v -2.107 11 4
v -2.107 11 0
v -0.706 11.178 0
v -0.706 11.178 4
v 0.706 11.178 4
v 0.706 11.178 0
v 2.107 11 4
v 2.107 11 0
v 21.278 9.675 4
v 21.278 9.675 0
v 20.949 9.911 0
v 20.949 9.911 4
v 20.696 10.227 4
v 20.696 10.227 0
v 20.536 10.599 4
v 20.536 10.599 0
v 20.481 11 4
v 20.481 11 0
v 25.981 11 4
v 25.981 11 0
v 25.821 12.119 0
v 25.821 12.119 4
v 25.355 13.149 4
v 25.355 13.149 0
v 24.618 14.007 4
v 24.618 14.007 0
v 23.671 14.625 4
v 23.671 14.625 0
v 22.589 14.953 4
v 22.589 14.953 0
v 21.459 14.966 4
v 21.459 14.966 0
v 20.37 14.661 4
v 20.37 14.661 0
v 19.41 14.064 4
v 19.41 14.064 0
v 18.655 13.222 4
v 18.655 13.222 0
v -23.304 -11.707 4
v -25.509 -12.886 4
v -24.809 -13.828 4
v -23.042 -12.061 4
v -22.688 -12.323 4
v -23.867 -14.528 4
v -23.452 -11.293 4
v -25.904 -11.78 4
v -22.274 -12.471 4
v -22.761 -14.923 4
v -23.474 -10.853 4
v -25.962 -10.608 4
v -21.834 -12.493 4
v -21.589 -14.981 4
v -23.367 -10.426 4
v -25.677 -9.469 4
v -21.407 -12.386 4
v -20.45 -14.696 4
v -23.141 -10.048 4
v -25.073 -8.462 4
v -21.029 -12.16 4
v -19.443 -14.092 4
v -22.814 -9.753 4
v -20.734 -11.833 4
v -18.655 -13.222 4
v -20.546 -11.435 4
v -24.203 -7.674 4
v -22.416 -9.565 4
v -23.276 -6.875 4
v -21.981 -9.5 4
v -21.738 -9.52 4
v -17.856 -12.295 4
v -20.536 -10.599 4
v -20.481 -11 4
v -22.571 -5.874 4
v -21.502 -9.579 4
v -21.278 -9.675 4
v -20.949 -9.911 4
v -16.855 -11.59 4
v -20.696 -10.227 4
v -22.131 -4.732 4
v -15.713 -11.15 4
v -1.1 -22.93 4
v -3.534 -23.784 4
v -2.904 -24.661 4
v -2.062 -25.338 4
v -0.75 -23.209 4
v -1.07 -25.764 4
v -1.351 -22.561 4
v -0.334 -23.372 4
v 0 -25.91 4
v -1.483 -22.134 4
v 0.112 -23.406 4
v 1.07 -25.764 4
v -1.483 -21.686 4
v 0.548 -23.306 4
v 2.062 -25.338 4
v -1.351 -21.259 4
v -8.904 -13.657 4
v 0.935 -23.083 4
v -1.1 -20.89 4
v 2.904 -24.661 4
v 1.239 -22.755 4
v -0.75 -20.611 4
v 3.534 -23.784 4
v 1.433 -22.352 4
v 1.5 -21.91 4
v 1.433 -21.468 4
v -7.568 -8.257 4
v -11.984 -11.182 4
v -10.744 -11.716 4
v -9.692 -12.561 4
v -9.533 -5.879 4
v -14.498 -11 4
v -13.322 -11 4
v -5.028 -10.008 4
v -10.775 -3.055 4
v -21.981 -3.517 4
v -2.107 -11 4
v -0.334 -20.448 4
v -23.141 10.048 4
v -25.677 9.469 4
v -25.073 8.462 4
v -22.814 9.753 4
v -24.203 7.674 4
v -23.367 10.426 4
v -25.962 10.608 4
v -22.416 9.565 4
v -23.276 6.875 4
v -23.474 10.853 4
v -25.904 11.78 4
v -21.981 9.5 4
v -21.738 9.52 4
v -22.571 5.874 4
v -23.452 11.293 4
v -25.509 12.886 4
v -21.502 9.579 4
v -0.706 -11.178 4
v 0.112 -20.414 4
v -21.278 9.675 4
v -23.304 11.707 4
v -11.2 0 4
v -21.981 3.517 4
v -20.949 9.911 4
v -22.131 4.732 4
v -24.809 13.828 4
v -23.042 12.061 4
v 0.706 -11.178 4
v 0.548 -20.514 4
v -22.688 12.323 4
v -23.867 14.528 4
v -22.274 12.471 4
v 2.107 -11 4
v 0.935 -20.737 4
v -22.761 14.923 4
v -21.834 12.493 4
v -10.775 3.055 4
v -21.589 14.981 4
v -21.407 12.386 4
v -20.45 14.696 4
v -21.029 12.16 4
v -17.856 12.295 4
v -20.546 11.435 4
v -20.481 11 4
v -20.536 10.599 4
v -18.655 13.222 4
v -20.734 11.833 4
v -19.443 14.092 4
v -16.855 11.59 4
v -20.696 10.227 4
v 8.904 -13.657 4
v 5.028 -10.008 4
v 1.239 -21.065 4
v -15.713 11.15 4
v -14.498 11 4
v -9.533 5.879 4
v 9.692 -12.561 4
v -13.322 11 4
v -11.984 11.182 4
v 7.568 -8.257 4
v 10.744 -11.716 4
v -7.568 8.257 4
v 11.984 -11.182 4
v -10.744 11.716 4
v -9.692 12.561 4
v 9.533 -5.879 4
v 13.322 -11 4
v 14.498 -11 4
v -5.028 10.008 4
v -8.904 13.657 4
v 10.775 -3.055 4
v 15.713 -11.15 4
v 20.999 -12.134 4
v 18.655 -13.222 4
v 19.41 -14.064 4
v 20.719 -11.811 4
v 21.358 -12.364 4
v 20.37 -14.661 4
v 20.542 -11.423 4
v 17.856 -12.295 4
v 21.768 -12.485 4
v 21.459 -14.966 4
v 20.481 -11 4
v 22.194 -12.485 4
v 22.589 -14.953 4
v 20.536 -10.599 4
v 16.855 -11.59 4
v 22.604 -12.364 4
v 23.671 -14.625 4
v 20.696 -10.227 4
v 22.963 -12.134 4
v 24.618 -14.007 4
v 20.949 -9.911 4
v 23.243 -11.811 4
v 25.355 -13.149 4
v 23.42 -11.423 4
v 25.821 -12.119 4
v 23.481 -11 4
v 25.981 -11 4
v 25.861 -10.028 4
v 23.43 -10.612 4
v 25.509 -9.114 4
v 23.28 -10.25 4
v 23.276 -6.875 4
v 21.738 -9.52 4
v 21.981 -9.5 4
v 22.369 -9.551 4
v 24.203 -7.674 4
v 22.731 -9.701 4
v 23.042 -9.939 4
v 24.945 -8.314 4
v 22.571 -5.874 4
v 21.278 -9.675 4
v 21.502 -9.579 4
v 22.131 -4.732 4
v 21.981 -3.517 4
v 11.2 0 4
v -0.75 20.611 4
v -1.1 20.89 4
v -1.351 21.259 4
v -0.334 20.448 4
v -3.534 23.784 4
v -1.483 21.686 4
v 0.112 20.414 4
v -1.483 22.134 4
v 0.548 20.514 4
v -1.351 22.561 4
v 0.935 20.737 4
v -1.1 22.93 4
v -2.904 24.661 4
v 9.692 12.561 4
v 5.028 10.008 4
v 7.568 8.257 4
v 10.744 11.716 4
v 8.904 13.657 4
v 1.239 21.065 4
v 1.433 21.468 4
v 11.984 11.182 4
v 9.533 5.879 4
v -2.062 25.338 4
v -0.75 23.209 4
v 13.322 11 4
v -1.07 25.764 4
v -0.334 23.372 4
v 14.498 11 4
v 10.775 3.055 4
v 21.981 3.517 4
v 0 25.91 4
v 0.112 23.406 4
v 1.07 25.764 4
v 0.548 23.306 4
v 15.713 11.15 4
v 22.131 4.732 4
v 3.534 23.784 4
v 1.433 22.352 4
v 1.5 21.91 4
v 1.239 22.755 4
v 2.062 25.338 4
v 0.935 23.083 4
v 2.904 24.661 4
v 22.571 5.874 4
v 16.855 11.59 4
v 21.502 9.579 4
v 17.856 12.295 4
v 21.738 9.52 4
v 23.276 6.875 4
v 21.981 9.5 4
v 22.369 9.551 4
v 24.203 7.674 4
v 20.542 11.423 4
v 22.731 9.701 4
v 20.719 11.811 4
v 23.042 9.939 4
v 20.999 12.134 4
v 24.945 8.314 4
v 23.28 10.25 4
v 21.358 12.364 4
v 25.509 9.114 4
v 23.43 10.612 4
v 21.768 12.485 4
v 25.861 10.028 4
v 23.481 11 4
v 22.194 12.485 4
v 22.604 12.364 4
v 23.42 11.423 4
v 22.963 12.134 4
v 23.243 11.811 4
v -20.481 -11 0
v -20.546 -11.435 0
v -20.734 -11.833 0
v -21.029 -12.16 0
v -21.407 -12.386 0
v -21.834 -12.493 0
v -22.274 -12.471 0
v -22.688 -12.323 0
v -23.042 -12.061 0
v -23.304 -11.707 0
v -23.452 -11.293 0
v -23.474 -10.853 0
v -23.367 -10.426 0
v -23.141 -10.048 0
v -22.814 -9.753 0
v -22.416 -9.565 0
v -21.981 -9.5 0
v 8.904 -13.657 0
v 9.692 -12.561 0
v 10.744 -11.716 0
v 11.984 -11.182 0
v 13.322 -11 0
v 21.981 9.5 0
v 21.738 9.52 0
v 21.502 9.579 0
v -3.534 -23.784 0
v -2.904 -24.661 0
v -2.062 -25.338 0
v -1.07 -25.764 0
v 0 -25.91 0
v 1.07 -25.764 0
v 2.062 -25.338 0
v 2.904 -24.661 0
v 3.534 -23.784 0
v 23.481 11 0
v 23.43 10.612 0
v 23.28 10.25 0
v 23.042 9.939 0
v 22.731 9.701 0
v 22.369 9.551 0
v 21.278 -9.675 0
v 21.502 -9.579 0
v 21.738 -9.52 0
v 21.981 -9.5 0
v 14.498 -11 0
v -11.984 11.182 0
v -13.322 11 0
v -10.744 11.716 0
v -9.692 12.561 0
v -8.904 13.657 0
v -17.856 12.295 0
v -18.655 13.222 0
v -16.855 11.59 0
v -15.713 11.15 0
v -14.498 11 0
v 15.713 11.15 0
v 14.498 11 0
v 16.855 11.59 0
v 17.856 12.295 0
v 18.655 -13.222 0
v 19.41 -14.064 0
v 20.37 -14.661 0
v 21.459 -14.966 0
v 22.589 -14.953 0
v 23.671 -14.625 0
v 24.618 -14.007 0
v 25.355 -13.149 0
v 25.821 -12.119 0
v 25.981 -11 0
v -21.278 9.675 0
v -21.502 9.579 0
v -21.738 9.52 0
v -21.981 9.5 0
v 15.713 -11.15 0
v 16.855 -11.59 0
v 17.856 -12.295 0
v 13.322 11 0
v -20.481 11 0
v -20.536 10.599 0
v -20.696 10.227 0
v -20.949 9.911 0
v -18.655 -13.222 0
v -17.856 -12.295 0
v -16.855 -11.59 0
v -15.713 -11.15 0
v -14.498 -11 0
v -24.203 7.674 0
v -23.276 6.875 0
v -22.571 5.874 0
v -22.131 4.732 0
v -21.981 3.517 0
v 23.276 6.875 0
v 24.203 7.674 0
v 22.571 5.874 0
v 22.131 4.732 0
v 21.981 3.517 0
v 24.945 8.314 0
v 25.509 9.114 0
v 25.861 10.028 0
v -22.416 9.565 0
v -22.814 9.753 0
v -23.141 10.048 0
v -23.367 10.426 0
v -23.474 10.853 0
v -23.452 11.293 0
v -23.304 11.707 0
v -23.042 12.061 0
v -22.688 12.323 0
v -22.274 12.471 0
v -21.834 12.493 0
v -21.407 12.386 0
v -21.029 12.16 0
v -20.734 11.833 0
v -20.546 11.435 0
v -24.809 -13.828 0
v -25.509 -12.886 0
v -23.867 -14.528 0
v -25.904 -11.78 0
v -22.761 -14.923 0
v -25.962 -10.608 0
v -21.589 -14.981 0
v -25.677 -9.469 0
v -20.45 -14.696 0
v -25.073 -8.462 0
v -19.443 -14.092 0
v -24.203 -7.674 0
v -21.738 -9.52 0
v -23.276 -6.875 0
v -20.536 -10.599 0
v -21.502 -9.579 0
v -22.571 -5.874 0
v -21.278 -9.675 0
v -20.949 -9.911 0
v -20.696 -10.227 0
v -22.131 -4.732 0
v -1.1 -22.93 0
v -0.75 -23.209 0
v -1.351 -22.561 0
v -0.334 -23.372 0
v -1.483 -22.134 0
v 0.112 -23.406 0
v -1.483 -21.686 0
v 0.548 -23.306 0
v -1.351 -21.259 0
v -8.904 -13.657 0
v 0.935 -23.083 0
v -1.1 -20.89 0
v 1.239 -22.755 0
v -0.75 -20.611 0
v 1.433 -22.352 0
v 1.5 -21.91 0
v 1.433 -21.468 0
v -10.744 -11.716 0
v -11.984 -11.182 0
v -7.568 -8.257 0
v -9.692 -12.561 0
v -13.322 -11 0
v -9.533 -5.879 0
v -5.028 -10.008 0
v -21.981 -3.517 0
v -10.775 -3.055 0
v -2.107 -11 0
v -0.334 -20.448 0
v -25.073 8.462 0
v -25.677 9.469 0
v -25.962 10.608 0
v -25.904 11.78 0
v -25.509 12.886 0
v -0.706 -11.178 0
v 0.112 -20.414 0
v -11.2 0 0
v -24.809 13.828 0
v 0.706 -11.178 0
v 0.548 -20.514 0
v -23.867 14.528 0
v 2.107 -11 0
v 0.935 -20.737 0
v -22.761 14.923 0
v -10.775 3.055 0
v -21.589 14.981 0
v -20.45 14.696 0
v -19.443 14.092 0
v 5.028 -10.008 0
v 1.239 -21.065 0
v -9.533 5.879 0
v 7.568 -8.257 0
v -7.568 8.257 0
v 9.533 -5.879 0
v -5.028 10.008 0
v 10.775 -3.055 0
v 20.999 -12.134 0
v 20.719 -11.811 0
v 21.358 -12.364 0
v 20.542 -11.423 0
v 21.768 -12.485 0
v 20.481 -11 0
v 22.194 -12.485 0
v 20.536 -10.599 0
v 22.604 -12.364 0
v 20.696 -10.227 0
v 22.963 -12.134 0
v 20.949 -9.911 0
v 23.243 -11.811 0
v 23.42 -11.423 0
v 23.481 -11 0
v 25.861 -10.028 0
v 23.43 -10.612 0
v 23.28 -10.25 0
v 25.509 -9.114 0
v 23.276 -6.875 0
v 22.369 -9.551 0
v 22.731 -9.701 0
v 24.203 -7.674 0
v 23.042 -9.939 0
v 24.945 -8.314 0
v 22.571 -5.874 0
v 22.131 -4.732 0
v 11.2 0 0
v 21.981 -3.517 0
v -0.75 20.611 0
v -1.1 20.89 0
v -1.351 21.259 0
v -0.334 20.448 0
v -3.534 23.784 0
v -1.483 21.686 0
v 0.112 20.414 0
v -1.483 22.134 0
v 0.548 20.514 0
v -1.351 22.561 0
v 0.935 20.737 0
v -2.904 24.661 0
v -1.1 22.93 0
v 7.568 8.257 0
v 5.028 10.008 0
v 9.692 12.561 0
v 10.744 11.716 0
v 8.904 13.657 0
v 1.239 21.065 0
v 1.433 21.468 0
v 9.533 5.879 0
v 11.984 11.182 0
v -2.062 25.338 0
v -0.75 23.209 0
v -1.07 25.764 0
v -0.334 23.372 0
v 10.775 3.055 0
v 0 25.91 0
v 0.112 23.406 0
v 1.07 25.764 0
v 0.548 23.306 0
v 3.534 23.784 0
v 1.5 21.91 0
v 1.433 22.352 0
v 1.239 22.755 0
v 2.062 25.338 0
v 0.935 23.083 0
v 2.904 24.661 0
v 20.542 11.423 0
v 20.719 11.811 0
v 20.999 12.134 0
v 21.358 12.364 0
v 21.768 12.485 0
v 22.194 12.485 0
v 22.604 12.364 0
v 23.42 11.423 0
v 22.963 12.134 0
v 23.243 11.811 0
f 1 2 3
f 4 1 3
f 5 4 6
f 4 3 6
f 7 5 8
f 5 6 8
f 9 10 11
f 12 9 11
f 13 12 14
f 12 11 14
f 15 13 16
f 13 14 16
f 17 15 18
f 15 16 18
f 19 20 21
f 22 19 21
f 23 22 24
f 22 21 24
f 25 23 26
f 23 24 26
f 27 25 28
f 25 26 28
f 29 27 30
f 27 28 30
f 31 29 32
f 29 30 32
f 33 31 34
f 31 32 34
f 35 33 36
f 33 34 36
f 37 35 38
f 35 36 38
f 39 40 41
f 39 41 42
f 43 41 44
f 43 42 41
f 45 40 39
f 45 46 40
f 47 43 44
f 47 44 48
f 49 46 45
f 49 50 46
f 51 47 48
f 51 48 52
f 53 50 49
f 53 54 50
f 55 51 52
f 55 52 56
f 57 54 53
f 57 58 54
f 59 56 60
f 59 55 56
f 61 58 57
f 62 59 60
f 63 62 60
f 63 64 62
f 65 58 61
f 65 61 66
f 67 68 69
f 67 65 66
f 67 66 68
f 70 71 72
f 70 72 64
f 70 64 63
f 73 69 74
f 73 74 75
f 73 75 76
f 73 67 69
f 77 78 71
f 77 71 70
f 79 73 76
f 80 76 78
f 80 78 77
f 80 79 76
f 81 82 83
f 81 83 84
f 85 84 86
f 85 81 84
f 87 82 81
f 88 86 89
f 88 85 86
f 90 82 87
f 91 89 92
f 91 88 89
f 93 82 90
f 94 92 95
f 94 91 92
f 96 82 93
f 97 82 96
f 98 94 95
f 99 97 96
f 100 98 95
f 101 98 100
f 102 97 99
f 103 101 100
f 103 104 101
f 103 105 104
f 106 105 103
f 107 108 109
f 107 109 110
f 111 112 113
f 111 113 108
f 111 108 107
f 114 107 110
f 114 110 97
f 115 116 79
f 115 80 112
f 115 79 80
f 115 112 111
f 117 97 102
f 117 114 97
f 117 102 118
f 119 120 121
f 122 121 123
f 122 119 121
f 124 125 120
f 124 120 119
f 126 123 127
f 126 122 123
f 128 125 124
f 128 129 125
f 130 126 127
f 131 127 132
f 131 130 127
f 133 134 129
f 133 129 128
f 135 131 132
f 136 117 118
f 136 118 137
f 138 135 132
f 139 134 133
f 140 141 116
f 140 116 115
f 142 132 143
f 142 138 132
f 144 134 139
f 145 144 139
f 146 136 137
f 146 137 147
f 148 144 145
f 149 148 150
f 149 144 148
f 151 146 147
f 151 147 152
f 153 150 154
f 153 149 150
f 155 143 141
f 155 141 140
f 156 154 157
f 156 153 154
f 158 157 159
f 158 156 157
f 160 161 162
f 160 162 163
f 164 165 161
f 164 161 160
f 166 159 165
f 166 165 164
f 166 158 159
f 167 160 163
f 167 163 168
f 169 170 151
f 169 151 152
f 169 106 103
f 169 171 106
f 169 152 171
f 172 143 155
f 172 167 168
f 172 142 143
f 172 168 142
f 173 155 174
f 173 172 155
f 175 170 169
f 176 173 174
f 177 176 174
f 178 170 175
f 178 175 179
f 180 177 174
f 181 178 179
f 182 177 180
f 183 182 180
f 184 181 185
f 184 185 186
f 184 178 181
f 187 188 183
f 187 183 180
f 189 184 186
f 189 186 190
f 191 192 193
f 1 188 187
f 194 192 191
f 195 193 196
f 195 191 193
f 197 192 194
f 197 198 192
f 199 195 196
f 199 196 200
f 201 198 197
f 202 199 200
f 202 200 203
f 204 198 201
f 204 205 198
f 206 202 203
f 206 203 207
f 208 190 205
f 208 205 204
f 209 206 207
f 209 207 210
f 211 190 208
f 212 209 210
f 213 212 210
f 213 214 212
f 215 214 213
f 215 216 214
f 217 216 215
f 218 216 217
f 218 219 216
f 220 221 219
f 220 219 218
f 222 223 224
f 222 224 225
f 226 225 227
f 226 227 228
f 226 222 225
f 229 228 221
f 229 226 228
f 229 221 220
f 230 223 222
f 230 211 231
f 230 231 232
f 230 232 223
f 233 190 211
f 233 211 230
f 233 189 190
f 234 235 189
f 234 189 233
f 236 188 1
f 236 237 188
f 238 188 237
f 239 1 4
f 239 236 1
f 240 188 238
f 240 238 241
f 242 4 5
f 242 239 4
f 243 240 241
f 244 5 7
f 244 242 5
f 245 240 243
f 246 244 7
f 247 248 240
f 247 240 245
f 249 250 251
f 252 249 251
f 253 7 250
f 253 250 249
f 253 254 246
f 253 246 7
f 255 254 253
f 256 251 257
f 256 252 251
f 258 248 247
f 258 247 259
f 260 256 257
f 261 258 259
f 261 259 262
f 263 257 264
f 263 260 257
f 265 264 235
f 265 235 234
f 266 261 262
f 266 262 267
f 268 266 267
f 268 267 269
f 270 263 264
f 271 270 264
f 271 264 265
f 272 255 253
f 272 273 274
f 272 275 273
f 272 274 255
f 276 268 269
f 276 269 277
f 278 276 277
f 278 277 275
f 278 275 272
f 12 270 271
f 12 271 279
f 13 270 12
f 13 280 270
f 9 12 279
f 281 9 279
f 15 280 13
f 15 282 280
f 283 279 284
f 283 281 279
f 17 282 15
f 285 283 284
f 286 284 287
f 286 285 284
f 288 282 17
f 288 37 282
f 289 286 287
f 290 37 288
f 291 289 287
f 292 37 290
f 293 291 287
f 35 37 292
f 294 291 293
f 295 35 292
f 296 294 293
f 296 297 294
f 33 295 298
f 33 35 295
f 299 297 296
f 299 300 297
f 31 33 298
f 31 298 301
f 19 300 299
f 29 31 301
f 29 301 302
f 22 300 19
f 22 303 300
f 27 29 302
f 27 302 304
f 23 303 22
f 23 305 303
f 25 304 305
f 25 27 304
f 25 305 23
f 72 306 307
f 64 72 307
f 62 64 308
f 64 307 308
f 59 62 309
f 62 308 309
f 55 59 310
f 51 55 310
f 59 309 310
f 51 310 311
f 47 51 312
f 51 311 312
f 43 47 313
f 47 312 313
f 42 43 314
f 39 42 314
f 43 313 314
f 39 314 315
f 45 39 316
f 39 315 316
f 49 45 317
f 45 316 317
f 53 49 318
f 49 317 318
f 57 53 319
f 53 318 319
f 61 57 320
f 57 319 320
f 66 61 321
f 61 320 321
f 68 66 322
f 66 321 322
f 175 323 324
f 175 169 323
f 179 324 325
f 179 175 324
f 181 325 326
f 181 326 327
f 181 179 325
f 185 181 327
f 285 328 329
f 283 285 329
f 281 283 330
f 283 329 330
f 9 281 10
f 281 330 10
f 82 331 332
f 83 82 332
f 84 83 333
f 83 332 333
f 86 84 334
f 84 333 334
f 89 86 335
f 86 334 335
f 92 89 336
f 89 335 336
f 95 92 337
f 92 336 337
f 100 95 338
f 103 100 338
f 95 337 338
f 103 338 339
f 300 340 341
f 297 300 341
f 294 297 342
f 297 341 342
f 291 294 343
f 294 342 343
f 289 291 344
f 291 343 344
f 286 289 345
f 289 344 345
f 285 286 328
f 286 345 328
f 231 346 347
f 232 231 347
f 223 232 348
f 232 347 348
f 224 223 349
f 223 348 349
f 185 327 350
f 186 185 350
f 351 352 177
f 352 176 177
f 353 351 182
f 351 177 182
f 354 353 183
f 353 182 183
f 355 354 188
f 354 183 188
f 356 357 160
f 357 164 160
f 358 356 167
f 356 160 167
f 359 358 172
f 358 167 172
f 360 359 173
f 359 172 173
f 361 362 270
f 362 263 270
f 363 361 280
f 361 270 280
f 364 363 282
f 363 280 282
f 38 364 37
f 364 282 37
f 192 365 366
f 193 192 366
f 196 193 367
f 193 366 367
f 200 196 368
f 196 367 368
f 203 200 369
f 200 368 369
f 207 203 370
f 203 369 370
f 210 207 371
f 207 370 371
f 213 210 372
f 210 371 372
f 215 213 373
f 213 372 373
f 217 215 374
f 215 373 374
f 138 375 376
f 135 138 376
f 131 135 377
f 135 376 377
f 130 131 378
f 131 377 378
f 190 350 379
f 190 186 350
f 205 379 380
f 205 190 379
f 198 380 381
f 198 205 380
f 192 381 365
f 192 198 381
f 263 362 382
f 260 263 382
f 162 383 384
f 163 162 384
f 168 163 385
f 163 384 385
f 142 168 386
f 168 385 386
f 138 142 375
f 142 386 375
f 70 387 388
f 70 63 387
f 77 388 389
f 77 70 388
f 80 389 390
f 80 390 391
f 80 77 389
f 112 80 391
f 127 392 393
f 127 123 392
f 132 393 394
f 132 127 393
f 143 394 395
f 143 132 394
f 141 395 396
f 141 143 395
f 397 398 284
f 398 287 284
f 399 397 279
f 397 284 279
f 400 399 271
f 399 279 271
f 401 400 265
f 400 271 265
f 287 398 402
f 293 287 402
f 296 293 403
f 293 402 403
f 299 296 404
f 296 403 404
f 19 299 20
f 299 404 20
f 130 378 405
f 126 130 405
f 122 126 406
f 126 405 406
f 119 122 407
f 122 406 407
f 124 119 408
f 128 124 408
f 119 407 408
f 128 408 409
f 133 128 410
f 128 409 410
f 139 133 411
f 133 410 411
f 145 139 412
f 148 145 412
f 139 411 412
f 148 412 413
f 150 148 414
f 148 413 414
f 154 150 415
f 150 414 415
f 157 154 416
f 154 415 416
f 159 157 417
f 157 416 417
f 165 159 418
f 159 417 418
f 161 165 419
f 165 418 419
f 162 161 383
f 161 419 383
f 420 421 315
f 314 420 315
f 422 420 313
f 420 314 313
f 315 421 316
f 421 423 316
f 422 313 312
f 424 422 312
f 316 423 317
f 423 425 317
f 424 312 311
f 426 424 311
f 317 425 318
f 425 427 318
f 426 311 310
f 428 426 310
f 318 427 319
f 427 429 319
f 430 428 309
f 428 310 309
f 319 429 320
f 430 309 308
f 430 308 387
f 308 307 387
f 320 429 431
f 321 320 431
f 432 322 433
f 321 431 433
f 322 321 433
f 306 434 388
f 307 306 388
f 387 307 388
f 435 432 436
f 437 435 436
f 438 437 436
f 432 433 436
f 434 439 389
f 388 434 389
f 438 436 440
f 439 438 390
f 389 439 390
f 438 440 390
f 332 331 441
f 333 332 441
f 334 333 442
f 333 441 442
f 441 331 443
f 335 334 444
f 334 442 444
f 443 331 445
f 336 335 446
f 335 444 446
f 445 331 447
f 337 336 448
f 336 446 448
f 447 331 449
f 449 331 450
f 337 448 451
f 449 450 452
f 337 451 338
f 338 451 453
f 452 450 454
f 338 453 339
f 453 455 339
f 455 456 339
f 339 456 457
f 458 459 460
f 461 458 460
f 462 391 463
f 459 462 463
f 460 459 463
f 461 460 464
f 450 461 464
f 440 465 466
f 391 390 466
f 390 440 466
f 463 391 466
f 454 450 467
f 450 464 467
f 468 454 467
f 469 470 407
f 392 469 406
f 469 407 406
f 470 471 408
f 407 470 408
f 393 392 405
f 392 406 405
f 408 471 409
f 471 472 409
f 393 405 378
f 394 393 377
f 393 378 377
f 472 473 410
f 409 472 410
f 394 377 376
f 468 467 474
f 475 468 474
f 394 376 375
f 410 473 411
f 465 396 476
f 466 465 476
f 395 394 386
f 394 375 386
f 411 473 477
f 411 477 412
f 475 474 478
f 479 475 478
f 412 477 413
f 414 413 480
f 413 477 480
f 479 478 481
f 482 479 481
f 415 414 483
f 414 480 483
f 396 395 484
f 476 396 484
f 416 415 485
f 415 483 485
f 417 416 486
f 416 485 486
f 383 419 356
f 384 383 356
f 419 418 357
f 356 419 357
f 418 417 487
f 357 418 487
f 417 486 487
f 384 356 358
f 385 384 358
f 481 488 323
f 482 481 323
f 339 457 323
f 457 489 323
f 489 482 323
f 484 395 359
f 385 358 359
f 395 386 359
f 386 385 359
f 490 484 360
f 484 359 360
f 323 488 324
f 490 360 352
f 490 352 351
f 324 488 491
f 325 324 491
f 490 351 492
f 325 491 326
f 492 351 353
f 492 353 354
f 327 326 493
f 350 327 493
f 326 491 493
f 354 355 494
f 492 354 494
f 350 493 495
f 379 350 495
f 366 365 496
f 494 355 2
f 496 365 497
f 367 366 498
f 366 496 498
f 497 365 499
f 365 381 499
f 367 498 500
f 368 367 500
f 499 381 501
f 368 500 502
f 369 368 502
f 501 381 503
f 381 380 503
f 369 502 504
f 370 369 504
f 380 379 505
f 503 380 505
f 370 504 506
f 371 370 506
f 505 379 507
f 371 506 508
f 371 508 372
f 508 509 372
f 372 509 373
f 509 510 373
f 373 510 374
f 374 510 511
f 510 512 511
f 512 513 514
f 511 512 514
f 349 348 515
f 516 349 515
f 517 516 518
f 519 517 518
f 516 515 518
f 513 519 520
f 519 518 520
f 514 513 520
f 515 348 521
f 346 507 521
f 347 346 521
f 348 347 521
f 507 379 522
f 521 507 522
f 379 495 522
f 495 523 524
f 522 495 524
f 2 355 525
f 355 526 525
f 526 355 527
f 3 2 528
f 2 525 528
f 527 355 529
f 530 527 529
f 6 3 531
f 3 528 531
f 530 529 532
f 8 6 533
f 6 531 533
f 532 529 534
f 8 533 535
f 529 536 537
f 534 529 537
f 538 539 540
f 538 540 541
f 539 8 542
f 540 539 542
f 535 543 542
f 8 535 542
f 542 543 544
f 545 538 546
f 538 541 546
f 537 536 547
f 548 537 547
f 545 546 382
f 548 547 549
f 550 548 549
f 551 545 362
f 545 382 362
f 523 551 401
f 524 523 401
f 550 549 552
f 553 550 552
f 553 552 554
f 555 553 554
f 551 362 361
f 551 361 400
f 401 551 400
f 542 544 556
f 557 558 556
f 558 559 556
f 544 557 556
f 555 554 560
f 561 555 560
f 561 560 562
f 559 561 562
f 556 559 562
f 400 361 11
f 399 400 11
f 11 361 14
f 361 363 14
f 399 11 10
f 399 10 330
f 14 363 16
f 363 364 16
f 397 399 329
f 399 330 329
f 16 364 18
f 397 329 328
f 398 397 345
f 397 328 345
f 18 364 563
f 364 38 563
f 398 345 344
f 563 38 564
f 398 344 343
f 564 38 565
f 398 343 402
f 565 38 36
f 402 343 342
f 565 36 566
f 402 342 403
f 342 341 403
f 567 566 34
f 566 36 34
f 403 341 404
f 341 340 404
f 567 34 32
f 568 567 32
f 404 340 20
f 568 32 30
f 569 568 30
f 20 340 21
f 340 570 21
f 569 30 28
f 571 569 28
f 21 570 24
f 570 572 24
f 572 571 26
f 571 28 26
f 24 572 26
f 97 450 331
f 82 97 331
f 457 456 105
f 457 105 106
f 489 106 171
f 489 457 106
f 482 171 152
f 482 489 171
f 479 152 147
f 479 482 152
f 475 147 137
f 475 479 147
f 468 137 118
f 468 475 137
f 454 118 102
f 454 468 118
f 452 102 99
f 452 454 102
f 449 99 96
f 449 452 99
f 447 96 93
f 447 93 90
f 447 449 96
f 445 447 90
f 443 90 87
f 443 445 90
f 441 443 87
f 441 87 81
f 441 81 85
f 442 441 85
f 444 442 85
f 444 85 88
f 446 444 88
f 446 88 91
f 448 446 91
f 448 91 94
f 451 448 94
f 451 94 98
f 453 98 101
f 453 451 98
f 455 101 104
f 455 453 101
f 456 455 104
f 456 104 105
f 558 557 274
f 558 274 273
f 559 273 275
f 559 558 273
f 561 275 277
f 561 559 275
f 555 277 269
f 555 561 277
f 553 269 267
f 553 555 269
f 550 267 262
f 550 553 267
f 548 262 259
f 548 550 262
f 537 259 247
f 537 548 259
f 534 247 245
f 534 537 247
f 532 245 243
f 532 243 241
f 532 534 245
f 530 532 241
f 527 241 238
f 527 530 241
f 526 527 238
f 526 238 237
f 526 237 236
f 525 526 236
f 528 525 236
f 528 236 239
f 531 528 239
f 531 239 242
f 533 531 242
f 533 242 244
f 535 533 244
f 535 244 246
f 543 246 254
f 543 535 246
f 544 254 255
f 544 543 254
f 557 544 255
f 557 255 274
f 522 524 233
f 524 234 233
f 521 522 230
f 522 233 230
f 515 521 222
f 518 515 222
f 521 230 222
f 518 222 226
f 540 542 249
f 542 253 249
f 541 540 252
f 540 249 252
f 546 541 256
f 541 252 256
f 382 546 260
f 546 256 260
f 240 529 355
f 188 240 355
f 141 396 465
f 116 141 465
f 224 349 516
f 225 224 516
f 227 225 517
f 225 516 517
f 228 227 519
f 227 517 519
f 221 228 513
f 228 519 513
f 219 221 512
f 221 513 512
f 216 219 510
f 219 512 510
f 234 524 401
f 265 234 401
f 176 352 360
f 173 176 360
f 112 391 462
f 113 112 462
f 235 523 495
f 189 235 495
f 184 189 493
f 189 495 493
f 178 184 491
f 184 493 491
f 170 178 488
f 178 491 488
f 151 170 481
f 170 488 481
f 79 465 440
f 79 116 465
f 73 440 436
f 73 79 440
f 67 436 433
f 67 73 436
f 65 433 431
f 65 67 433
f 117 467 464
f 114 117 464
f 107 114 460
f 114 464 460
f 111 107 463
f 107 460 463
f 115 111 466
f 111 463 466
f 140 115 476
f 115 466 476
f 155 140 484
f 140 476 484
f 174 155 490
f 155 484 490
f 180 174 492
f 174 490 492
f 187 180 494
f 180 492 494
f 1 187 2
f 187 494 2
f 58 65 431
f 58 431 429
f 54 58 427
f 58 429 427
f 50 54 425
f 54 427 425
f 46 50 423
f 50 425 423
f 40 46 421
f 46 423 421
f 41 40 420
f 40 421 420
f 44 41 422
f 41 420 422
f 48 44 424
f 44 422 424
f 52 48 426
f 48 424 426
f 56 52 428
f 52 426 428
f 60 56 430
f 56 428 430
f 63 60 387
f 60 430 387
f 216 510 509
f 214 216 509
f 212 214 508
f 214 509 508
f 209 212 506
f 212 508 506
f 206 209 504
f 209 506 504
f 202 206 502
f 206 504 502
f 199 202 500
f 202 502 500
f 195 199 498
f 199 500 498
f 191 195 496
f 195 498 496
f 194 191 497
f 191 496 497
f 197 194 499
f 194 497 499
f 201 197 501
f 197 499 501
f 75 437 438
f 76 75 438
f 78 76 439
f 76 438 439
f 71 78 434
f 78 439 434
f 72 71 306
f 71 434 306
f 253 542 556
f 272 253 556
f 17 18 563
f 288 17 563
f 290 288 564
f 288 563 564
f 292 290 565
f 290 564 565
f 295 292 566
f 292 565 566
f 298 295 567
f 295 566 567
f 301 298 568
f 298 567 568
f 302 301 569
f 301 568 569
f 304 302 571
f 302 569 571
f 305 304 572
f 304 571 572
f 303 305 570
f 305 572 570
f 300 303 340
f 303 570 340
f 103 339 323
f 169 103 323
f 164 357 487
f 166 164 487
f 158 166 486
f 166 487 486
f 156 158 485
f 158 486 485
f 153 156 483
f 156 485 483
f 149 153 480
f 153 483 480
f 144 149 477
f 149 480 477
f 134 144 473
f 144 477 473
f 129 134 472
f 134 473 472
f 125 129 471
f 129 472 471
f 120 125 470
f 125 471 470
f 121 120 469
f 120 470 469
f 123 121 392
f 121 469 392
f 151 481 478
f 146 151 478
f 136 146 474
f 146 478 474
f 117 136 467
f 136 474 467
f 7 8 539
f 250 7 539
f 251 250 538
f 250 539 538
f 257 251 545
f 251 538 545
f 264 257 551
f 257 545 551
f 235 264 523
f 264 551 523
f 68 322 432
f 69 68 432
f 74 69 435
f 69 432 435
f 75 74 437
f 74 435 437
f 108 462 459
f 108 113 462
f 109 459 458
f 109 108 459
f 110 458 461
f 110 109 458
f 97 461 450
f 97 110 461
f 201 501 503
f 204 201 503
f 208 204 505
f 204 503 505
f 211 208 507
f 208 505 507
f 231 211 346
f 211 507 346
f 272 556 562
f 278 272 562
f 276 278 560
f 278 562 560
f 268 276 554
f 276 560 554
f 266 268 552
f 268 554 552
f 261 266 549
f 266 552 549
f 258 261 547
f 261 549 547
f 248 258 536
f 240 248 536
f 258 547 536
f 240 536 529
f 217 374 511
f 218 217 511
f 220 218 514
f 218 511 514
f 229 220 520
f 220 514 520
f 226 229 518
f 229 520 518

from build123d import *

# Parameters (mm, degrees)
F0_R     = 1.5
F1_DEPTH = 4
F2_R     = 5


with BuildPart() as f1:
    # F0 (on Top) → F1 (new body)
    with BuildSketch(Plane.XY):
        with BuildLine():
            Line((-17.981, -11), (-10.3136468418, -11))
            Line((-10.3136468418, -11), (-16.1473234209, 0))
            Line((-16.1473234209, 0), (-20.1069034152, -7.4661972337))
            ThreePointArc((-20.1069034152, -7.4661972337), (-18.5534362632, -8.938009013), (-17.981, -11))
        make_face()
        with BuildLine():
            Line((-20.1069034152, -7.4661972337), (-16.1473234209, 0))
            Line((-16.1473234209, 0), (-20.1069034152, 7.4661972337))
            ThreePointArc((-20.1069034152, 7.4661972337), (-21.0153942484, 7.1182986291), (-21.981, 7))
            Line((-21.981, 7), (-21.981, -7))
            ThreePointArc((-21.981, -7), (-21.0153942484, -7.1182986291), (-20.1069034152, -7.4661972337))
        make_face()
        with BuildLine():
            Line((-16.1473234209, 0), (-10.3136468418, 11))
            Line((-10.3136468418, 11), (-17.981, 11))
            ThreePointArc((-17.981, 11), (-18.5534362632, 8.938009013), (-20.1069034152, 7.4661972337))
            Line((-20.1069034152, 7.4661972337), (-16.1473234209, 0))
        make_face()
        with BuildLine():
            ThreePointArc((-20.1069034152, 7.4661972337), (-18.5534362632, 8.938009013), (-17.981, 11))
            Line((-17.981, 11), (-20.481, 11))
            ThreePointArc((-20.481, 11), (-20.6956635987, 10.2267533799), (-21.2782137807, 9.6748239626))
            Line((-21.2782137807, 9.6748239626), (-20.1069034152, 7.4661972337))
        make_face()
        with BuildLine():
            Line((-20.481, 11), (-17.981, 11))
            ThreePointArc((-17.981, 11), (-24.8094271247, 13.8284271247), (-21.981, 7))
            Line((-21.981, 7), (-21.981, 9.5))
            ThreePointArc((-21.981, 9.5), (-23.0416601718, 12.0606601718), (-20.481, 11))
        make_face()
        with BuildLine():
            ThreePointArc((-21.981, 7), (-21.0153942484, 7.1182986291), (-20.1069034152, 7.4661972337))
            Line((-20.1069034152, 7.4661972337), (-21.2782137807, 9.6748239626))
            ThreePointArc((-21.2782137807, 9.6748239626), (-21.6188978432, 9.5443619859), (-21.981, 9.5))
            Line((-21.981, 9.5), (-21.981, 7))
        make_face()
        with BuildLine():
            Line((-21.2782137807, -9.6748239626), (-20.1069034152, -7.4661972337))
            ThreePointArc((-20.1069034152, -7.4661972337), (-21.0153942484, -7.1182986291), (-21.981, -7))
            Line((-21.981, -7), (-21.981, -9.5))
            ThreePointArc((-21.981, -9.5), (-21.6188978432, -9.5443619859), (-21.2782137807, -9.6748239626))
        make_face()
        with BuildLine():
            Line((-20.481, -11), (-17.981, -11))
            ThreePointArc((-17.981, -11), (-18.5534362632, -8.938009013), (-20.1069034152, -7.4661972337))
            Line((-20.1069034152, -7.4661972337), (-21.2782137807, -9.6748239626))
            ThreePointArc((-21.2782137807, -9.6748239626), (-20.6956635987, -10.2267533799), (-20.481, -11))
        make_face()
        with BuildLine():
            ThreePointArc((-21.981, -7), (-24.8094271247, -13.8284271247), (-17.981, -11))
            Line((-17.981, -11), (-20.481, -11))
            ThreePointArc((-20.481, -11), (-23.0416601718, -12.0606601718), (-21.981, -9.5))
            Line((-21.981, -9.5), (-21.981, -7))
        make_face()
        with BuildLine():
            Line((17.981, -11), (20.481, -11))
            ThreePointArc((20.481, -11), (20.6956635987, -10.2267533799), (21.2782137807, -9.6748239626))
            Line((21.2782137807, -9.6748239626), (20.1069034152, -7.4661972337))
            ThreePointArc((20.1069034152, -7.4661972337), (18.5534362632, -8.938009013), (17.981, -11))
        make_face()
        with BuildLine():
            ThreePointArc((21.2782137807, -9.6748239626), (21.6188978432, -9.5443619859), (21.981, -9.5))
            Line((21.981, -9.5), (21.981, -7))
            ThreePointArc((21.981, -7), (21.0153942484, -7.1182986291), (20.1069034152, -7.4661972337))
            Line((20.1069034152, -7.4661972337), (21.2782137807, -9.6748239626))
        make_face()
        with BuildLine():
            ThreePointArc((23.481, -11), (21.981, -12.5), (20.481, -11))
            Line((20.481, -11), (17.981, -11))
            ThreePointArc((17.981, -11), (21.981, -15), (25.981, -11))
            ThreePointArc((25.981, -11), (24.8094271247, -8.1715728753), (21.981, -7))
            Line((21.981, -7), (21.981, -9.5))
            ThreePointArc((21.981, -9.5), (23.0416601718, -9.9393398282), (23.481, -11))
        make_face()
        with BuildLine():
            ThreePointArc((17.981, 11), (18.5534362632, 8.938009013), (20.1069034152, 7.4661972337))
            Line((20.1069034152, 7.4661972337), (21.2782137807, 9.6748239626))
            ThreePointArc((21.2782137807, 9.6748239626), (20.6956635987, 10.2267533799), (20.481, 11))
            Line((20.481, 11), (17.981, 11))
        make_face()
        with BuildLine():
            ThreePointArc((20.1069034152, 7.4661972337), (21.0153942484, 7.1182986291), (21.981, 7))
            Line((21.981, 7), (21.981, 9.5))
            ThreePointArc((21.981, 9.5), (21.6188978432, 9.5443619859), (21.2782137807, 9.6748239626))
            Line((21.2782137807, 9.6748239626), (20.1069034152, 7.4661972337))
        make_face()
        with BuildLine():
            Line((21.981, 9.5), (21.981, 7))
            ThreePointArc((21.981, 7), (24.8094271247, 8.1715728753), (25.981, 11))
            ThreePointArc((25.981, 11), (21.981, 15), (17.981, 11))
            Line((17.981, 11), (20.481, 11))
            ThreePointArc((20.481, 11), (21.981, 12.5), (23.481, 11))
            ThreePointArc((23.481, 11), (23.0416601718, 9.9393398282), (21.981, 9.5))
        make_face()
        with BuildLine():
            ThreePointArc((20.1069034152, -7.4661972337), (21.0153942484, -7.1182986291), (21.981, -7))
            Line((21.981, -7), (21.981, 7))
            ThreePointArc((21.981, 7), (21.0153942484, 7.1182986291), (20.1069034152, 7.4661972337))
            Line((20.1069034152, 7.4661972337), (16.1473234209, 0))
            Line((16.1473234209, 0), (20.1069034152, -7.4661972337))
        make_face()
        with BuildLine():
            Line((10.3136468418, 11), (16.1473234209, 0))
            Line((16.1473234209, 0), (20.1069034152, 7.4661972337))
            ThreePointArc((20.1069034152, 7.4661972337), (18.5534362632, 8.938009013), (17.981, 11))
            Line((17.981, 11), (10.3136468418, 11))
        make_face()
        with BuildLine():
            Line((10.3136468418, -11), (17.981, -11))
            ThreePointArc((17.981, -11), (18.5534362632, -8.938009013), (20.1069034152, -7.4661972337))
            Line((20.1069034152, -7.4661972337), (16.1473234209, 0))
            Line((16.1473234209, 0), (10.3136468418, -11))
        make_face()
        with BuildLine():
            Line((2.1071307506, -11), (10.3136468418, -11))
            Line((10.3136468418, -11), (16.1473234209, 0))
            Line((16.1473234209, 0), (10.3136468418, 11))
            Line((10.3136468418, 11), (2.1071307506, 11))
            ThreePointArc((2.1071307506, 11), (8.6324928151, 7.1358298604), (11.2, 0))
            ThreePointArc((11.2, 0), (8.6324928151, -7.1358298604), (2.1071307506, -11))
        make_face()
        with BuildLine():
            Line((-10.3136468418, -11), (-2.1071307506, -11))
            ThreePointArc((-2.1071307506, -11), (-11.2, 0), (-2.1071307506, 11))
            Line((-2.1071307506, 11), (-10.3136468418, 11))
            Line((-10.3136468418, 11), (-16.1473234209, 0))
            Line((-16.1473234209, 0), (-10.3136468418, -11))
        make_face()
        with BuildLine():
            Line((3.5338027663, -23.7840965848), (10.3136468418, -11))
            Line((10.3136468418, -11), (2.1071307506, -11))
            ThreePointArc((2.1071307506, -11), (0, -11.2), (-2.1071307506, -11))
            Line((-2.1071307506, -11), (-10.3136468418, -11))
            Line((-10.3136468418, -11), (-3.5338027663, -23.7840965848))
            ThreePointArc((-3.5338027663, -23.7840965848), (-0.9656057516, -18.0282986291), (4, -21.91))
            ThreePointArc((4, -21.91), (3.8817013709, -22.8756057516), (3.5338027663, -23.7840965848))
        make_face()
        with BuildLine():
            Line((2.1071307506, 11), (10.3136468418, 11))
            Line((10.3136468418, 11), (3.5338027663, 23.7840965848))
            ThreePointArc((3.5338027663, 23.7840965848), (3.8817013709, 22.8756057516), (4, 21.91))
            ThreePointArc((4, 21.91), (-0.9656057516, 18.0282986291), (-3.5338027663, 23.7840965848))
            Line((-3.5338027663, 23.7840965848), (-10.3136468418, 11))
            Line((-10.3136468418, 11), (-2.1071307506, 11))
            ThreePointArc((-2.1071307506, 11), (0, 11.2), (2.1071307506, 11))
        make_face()
        with BuildLine():
            ThreePointArc((4, 21.91), (3.8817013709, 22.8756057516), (3.5338027663, 23.7840965848))
            ThreePointArc((3.5338027663, 23.7840965848), (0, 25.91), (-3.5338027663, 23.7840965848))
            ThreePointArc((-3.5338027663, 23.7840965848), (-0.9656057516, 18.0282986291), (4, 21.91))
        make_face()
        with Locations((0, 21.91)):
            Circle(F0_R, mode=Mode.SUBTRACT)
        with BuildLine():
            ThreePointArc((-3.5338027663, -23.7840965848), (0, -25.91), (3.5338027663, -23.7840965848))
            ThreePointArc((3.5338027663, -23.7840965848), (3.8817013709, -22.8756057516), (4, -21.91))
            ThreePointArc((4, -21.91), (-0.9656057516, -18.0282986291), (-3.5338027663, -23.7840965848))
        make_face()
        with Locations((0, -21.91)):
            Circle(F0_R, mode=Mode.SUBTRACT)
    extrude(amount=F1_DEPTH)

    # F2
    f2_edges = [f1.edges().sort_by_distance(p)[0] for p in [
        (-17.981, -11, 2),
        (-10.313647, -11, 2),
        (-21.981, 7, 2),
        (-21.981, -7, 2),
        (-17.981, 11, 2),
        (-10.313647, 11, 2),
        (10.313647, 11, 2),
        (17.981, 11, 2),
        (21.981, 7, 2),
        (21.981, -7, 2),
        (17.981, -11, 2),
        (10.313647, -11, 2),
    ]]
    fillet(f2_edges, radius=F2_R)


solid = f1.part
